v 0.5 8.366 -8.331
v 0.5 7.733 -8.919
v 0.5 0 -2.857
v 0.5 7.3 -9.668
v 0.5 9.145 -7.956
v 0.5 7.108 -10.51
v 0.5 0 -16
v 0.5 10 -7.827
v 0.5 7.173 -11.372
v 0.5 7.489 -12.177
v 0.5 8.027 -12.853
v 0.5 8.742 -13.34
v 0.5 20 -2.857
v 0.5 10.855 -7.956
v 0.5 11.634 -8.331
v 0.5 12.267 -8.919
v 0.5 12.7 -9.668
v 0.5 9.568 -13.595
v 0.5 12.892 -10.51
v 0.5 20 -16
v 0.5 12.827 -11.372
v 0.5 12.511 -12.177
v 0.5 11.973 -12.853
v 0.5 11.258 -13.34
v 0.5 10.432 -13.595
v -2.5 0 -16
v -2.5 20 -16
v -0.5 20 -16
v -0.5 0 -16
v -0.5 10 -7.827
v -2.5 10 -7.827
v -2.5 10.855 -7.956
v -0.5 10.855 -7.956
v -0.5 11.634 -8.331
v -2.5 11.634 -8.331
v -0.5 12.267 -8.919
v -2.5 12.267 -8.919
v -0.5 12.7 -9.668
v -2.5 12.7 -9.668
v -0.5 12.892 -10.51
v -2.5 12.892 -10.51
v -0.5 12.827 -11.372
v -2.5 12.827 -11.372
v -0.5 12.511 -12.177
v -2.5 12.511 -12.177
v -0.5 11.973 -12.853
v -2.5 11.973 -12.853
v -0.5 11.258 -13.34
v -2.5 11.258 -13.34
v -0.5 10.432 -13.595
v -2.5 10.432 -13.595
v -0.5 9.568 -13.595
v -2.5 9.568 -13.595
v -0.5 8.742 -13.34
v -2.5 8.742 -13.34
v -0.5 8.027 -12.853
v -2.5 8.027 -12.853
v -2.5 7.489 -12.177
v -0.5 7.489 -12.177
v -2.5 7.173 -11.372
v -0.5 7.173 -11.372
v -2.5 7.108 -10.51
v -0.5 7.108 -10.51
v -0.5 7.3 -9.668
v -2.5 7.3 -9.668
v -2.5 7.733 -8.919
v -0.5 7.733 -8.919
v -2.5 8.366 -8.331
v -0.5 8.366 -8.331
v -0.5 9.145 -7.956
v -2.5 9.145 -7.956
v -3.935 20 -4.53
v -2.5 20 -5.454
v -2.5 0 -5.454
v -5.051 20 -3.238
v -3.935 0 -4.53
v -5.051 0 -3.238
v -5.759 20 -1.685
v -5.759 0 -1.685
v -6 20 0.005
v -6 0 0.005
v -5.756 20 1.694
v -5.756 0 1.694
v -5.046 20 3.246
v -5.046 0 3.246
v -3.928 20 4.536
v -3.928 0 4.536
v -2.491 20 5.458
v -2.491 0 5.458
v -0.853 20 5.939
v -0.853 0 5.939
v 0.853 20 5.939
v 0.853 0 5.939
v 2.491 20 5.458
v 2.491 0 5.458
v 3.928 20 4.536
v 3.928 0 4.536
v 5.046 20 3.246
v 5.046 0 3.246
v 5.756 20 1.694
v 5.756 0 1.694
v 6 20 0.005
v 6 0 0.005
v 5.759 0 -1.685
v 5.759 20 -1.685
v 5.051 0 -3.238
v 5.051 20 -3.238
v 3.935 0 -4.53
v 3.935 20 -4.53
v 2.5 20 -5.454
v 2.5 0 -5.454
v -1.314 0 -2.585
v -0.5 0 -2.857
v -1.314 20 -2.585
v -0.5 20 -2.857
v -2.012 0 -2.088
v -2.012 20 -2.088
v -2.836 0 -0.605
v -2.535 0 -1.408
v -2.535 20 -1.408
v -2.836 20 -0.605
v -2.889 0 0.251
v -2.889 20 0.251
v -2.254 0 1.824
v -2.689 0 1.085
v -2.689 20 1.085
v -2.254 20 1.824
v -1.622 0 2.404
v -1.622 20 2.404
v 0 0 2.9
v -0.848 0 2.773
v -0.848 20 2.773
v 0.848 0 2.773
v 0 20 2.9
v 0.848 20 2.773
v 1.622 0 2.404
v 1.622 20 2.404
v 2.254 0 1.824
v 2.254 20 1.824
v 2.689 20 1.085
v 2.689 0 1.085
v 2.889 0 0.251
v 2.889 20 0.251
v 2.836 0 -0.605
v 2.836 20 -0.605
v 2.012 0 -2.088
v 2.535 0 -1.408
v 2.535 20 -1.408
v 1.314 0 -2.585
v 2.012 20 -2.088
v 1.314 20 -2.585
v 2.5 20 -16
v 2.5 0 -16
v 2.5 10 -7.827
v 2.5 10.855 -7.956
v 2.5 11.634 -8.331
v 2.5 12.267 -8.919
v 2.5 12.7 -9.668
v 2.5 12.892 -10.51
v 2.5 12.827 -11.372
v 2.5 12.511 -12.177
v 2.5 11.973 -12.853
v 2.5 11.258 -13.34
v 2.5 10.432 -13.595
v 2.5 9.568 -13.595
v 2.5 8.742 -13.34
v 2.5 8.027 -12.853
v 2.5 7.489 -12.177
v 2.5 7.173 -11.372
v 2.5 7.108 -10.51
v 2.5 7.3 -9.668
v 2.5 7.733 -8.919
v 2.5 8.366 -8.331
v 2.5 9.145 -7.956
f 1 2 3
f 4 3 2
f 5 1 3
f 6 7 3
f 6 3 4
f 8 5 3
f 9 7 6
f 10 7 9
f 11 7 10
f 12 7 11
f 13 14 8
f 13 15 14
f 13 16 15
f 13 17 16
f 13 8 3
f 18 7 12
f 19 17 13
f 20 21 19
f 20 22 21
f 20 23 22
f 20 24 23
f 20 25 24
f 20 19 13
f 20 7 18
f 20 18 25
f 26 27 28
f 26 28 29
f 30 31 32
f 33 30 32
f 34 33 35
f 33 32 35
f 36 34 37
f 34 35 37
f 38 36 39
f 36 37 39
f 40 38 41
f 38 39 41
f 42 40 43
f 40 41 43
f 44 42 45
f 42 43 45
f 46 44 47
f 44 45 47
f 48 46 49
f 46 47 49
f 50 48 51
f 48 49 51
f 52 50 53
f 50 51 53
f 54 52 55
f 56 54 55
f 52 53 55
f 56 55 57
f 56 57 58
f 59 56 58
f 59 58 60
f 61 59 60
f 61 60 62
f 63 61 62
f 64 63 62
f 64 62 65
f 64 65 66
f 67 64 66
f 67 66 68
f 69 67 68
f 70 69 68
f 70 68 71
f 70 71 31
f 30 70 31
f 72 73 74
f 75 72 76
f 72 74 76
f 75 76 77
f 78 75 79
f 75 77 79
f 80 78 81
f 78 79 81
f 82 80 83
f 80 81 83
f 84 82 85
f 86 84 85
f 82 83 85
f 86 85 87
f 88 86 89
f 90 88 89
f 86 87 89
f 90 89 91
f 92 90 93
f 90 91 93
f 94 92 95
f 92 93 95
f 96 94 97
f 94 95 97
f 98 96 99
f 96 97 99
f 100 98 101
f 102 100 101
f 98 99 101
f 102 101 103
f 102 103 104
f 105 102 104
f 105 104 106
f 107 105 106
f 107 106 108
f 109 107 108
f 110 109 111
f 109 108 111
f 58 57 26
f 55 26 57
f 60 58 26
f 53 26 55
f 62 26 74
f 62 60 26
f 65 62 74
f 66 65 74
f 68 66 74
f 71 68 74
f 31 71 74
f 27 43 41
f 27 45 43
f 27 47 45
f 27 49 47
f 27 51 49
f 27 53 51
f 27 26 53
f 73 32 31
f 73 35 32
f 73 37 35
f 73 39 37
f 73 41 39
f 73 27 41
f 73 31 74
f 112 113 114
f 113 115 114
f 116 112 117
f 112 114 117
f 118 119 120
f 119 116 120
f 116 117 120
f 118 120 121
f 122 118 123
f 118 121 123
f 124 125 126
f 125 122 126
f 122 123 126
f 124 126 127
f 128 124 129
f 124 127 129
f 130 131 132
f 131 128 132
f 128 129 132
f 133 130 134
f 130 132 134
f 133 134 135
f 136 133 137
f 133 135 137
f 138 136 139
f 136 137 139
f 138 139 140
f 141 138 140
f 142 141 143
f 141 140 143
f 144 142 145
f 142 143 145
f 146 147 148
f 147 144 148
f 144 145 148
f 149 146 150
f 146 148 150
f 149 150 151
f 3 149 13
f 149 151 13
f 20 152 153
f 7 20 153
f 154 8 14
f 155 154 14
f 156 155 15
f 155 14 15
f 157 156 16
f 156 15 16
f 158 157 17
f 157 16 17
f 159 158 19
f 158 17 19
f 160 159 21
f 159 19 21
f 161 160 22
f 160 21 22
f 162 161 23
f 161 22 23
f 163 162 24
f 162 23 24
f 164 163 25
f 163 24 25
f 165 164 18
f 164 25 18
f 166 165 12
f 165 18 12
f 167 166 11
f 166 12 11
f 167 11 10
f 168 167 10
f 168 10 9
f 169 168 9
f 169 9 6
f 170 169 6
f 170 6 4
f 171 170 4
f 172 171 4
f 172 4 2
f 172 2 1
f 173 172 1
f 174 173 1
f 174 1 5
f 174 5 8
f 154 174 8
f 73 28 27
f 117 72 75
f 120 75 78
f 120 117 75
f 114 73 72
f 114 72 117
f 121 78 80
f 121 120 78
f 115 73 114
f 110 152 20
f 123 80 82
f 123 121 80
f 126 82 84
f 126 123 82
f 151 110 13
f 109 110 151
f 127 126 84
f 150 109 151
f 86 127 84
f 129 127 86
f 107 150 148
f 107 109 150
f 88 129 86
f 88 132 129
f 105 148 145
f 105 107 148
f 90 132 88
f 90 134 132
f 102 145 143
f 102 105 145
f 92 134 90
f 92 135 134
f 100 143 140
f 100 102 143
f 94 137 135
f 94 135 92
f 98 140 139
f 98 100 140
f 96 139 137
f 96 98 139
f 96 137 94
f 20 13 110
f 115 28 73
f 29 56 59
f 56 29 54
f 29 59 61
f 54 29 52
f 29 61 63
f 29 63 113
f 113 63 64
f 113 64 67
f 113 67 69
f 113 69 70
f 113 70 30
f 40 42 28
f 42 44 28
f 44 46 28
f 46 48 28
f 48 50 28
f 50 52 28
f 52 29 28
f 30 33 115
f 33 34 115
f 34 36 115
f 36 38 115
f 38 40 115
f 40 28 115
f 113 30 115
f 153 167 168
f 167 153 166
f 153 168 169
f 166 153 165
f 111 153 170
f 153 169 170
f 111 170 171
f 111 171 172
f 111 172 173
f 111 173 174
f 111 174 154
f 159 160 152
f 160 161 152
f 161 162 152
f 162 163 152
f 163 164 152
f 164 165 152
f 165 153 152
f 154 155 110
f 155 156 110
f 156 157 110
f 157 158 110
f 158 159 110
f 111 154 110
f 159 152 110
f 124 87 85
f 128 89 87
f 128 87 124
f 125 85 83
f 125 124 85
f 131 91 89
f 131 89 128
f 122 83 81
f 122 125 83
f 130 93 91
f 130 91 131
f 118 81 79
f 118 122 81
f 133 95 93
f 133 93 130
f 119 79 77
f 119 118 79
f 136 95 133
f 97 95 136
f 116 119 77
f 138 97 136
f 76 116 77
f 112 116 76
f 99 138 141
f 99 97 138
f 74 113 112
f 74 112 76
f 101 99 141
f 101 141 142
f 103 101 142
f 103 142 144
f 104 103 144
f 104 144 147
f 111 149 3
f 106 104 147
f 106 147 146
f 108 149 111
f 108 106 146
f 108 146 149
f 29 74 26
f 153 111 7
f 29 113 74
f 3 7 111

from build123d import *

# Parameters (mm, degrees)
SKETCH1_R           = 6
BOSS_EXTRUDE1_DEPTH = 20
SKETCH3_R           = 2.9
CUT_EXTRUDE1_DEPTH  = 26
BOSS_EXTRUDE2_DEPTH = 2
BOSS_EXTRUDE3_DEPTH = 2
SKETCH6_W           = 1
SKETCH6_H           = 20
CUT_EXTRUDE2_DEPTH  = 17
SKETCH7_R           = 2.9
CUT_EXTRUDE3_DEPTH  = 17


with BuildPart() as part:
    # Sketch1 → Boss-Extrude1 (new body)
    with BuildSketch(Plane(origin=(0, 0, 0), x_dir=(1, 0, 0), z_dir=(0, 1, 0))):
        with Locations(Location((0, 0, 0), (0, 0, 270))):
            Circle(SKETCH1_R)
    extrude(amount=BOSS_EXTRUDE1_DEPTH)

    # Sketch3 → Cut-Extrude1 (cut)
    with BuildSketch(Plane(origin=(0, 20, 0), x_dir=(1, 0, 0), z_dir=(0, 1, 0))):
        with Locations(Location((0, 0, 0), (0, 0, 270))):
            Circle(SKETCH3_R)
    extrude(amount=-CUT_EXTRUDE1_DEPTH, mode=Mode.SUBTRACT)

    # Sketch4 → Boss-Extrude2 (add)
    with BuildSketch(Plane(origin=(-2.5, 0, 0), x_dir=(0, 0, -1), z_dir=(1, 0, 0))):
        Polygon((6, 20), (16, 20), (16, 0), (6, 0), (4.545153511, 0), (4.545153511, 20), align=None)
    extrude(amount=BOSS_EXTRUDE2_DEPTH)

    # Sketch5 → Boss-Extrude3 (add)
    with BuildSketch(Plane(origin=(2.5, 0, 0), x_dir=(0, 0, -1), z_dir=(1, 0, 0))):
        Polygon((6, 20), (16, 20), (16, 0), (6, 0), (4.211348031, 0), (4.211348031, 20), align=None)
    extrude(amount=-BOSS_EXTRUDE3_DEPTH)

    # Sketch6 → Cut-Extrude2 (cut)
    with BuildSketch(Plane(origin=(0, 0, -16), x_dir=(-1, 0, 0), z_dir=(0, 0, -1))):
        with Locations((0, 10)):
            Rectangle(SKETCH6_W, SKETCH6_H)
    extrude(amount=-CUT_EXTRUDE2_DEPTH, mode=Mode.SUBTRACT)

    # Sketch7 → Cut-Extrude3 (cut)
    with BuildSketch(Plane.ZY.offset(2.5)):
        with Locations((-10.727178029, 10)):
            Circle(SKETCH7_R)
    extrude(amount=-CUT_EXTRUDE3_DEPTH, mode=Mode.SUBTRACT)


solid = part.part
